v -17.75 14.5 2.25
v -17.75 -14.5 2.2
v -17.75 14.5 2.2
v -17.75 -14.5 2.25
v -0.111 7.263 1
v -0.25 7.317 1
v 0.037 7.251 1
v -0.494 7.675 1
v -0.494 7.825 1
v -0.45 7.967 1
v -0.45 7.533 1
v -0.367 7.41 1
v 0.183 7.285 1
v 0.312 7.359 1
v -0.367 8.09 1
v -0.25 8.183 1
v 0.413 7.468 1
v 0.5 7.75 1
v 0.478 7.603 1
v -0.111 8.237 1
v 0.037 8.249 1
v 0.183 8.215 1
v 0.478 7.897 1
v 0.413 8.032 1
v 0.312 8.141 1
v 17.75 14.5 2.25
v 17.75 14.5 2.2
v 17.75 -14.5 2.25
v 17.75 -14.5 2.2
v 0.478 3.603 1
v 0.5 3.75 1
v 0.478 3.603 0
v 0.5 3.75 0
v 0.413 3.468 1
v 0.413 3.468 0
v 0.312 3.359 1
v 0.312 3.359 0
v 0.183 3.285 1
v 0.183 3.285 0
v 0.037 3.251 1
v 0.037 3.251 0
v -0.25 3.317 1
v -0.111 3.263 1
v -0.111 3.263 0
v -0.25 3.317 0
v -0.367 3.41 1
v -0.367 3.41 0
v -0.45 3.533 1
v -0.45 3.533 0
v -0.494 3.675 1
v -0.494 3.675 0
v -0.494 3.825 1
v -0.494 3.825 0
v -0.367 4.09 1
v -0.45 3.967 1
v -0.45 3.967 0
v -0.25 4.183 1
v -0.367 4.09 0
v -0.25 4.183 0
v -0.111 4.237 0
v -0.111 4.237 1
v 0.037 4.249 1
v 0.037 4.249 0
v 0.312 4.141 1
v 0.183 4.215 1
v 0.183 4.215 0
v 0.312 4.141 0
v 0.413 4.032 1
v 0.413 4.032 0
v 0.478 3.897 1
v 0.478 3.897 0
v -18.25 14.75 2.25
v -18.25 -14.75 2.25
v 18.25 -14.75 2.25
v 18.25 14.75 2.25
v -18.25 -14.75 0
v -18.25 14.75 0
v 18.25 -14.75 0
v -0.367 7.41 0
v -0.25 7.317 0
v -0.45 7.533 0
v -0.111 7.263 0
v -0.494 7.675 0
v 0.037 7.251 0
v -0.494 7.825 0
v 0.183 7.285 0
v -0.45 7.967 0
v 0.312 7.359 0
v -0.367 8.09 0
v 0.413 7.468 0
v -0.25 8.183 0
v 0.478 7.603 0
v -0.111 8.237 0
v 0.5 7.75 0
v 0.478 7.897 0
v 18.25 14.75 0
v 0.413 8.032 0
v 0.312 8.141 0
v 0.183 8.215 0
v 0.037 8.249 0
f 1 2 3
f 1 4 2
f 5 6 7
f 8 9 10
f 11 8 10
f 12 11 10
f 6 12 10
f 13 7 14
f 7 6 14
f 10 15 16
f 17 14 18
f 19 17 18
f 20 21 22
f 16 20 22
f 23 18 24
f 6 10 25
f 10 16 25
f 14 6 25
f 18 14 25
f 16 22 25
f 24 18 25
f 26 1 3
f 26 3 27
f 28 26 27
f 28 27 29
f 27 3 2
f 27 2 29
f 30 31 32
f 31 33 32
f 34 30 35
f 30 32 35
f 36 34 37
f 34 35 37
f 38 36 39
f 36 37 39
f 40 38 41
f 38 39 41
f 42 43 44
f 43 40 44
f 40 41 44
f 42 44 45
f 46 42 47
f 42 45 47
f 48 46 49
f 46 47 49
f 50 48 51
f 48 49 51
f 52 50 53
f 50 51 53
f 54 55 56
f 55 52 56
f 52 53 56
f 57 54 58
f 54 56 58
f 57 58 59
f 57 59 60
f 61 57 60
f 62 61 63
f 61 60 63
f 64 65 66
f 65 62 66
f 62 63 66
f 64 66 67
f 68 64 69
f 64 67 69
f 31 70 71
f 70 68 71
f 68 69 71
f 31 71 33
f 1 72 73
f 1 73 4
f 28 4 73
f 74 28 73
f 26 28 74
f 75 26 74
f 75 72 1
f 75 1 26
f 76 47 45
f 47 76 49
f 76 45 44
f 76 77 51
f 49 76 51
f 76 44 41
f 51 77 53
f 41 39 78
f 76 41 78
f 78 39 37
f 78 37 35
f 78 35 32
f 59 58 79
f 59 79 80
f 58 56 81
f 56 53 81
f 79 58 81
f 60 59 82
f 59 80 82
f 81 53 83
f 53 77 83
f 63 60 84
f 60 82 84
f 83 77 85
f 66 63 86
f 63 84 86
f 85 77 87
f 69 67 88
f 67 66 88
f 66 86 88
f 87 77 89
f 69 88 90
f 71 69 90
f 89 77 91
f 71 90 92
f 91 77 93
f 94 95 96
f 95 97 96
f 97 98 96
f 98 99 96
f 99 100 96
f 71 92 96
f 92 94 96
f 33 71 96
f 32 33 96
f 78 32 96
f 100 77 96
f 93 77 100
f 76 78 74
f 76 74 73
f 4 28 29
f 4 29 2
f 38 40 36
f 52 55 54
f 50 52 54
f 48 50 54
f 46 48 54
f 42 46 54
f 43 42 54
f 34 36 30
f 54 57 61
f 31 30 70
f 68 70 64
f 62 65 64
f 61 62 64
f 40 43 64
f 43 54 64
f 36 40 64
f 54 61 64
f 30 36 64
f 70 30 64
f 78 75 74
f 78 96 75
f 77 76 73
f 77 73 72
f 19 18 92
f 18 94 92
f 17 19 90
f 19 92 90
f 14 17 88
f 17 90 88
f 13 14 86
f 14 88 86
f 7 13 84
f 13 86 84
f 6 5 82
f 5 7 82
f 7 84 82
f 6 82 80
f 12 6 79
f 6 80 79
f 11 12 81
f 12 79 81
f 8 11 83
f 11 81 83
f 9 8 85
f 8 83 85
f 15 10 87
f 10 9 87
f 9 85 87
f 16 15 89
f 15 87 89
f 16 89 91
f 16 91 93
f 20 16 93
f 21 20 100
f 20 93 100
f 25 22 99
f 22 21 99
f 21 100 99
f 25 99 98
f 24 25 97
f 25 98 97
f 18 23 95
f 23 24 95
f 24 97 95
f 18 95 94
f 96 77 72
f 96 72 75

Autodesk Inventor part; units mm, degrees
ref_plane "YZ Plane" through (0, 0, 0) normal (1, 0, 0) x (0, 1, 0)
ref_plane "XZ Plane" through (0, 0, 0) normal (0, 1, 0) x (-1, 0, 0)
ref_plane "XY Plane" through (0, 0, 0) normal (0, 0, 1) x (1, 0, 0)
sketch "スケッチ1" plane through (0, 0, 0) normal (0, 0, 1) x (1, 0, 0)
  line L0 (-18.25, 14.75) -> (18.25, 14.75)
  line L1 (18.25, 14.75) -> (18.25, -14.75)
  line L2 (18.25, -14.75) -> (-18.25, -14.75)
  line L3 (-18.25, -14.75) -> (-18.25, 14.75)
  line L4 (0, 17.8351) -> (0, -18.1881) construction
  circle A0 centre (0, 7.75) radius 0.5
  circle A1 centre (0, 3.75) radius 0.5
  point P0 (0, 0)
  dimension "d0" = 18.25
  dimension "d1" = 18.25
  dimension "d2" = 14.75
  dimension "d3" = 14.75
  dimension "d18" = 1
  dimension "d19" = 7
  dimension "d20" = 1
  dimension "d21" = 4
extrude "押し出し1" add sketch "スケッチ1" along normal blind 2.25 contours L0 L1 L2 L3 | A0 | A1
sketch "スケッチ2" plane through (0, 0, 2.25) normal (0, 0, 1) x (1, 0, 0)
  line L0 (-17.75, 14.5) -> (17.75, 14.5)
  line L1 (17.75, 14.5) -> (17.75, -14.5)
  line L2 (17.75, -14.5) -> (-17.75, -14.5)
  line L3 (-17.75, -14.5) -> (-17.75, 14.5)
  line L4 (18.25, -14.75) -> (18.25, 14.75) projected
  point P0 (0, 0)
  dimension "d6" = 0.5
  dimension "d7" = 35.5
  dimension "d8" = 14.5
  dimension "d9" = 14.5
extrude "押し出し2" cut sketch "スケッチ2" against normal blind 0.05
extrude "押し出し5" cut sketch "スケッチ1" along normal blind 1 contours A0 | A1
equation "\"d1\" = d0"
equation "\"d3\" = d2"
equation "\"d9\" = d8"
properties part number "TFT_case"
